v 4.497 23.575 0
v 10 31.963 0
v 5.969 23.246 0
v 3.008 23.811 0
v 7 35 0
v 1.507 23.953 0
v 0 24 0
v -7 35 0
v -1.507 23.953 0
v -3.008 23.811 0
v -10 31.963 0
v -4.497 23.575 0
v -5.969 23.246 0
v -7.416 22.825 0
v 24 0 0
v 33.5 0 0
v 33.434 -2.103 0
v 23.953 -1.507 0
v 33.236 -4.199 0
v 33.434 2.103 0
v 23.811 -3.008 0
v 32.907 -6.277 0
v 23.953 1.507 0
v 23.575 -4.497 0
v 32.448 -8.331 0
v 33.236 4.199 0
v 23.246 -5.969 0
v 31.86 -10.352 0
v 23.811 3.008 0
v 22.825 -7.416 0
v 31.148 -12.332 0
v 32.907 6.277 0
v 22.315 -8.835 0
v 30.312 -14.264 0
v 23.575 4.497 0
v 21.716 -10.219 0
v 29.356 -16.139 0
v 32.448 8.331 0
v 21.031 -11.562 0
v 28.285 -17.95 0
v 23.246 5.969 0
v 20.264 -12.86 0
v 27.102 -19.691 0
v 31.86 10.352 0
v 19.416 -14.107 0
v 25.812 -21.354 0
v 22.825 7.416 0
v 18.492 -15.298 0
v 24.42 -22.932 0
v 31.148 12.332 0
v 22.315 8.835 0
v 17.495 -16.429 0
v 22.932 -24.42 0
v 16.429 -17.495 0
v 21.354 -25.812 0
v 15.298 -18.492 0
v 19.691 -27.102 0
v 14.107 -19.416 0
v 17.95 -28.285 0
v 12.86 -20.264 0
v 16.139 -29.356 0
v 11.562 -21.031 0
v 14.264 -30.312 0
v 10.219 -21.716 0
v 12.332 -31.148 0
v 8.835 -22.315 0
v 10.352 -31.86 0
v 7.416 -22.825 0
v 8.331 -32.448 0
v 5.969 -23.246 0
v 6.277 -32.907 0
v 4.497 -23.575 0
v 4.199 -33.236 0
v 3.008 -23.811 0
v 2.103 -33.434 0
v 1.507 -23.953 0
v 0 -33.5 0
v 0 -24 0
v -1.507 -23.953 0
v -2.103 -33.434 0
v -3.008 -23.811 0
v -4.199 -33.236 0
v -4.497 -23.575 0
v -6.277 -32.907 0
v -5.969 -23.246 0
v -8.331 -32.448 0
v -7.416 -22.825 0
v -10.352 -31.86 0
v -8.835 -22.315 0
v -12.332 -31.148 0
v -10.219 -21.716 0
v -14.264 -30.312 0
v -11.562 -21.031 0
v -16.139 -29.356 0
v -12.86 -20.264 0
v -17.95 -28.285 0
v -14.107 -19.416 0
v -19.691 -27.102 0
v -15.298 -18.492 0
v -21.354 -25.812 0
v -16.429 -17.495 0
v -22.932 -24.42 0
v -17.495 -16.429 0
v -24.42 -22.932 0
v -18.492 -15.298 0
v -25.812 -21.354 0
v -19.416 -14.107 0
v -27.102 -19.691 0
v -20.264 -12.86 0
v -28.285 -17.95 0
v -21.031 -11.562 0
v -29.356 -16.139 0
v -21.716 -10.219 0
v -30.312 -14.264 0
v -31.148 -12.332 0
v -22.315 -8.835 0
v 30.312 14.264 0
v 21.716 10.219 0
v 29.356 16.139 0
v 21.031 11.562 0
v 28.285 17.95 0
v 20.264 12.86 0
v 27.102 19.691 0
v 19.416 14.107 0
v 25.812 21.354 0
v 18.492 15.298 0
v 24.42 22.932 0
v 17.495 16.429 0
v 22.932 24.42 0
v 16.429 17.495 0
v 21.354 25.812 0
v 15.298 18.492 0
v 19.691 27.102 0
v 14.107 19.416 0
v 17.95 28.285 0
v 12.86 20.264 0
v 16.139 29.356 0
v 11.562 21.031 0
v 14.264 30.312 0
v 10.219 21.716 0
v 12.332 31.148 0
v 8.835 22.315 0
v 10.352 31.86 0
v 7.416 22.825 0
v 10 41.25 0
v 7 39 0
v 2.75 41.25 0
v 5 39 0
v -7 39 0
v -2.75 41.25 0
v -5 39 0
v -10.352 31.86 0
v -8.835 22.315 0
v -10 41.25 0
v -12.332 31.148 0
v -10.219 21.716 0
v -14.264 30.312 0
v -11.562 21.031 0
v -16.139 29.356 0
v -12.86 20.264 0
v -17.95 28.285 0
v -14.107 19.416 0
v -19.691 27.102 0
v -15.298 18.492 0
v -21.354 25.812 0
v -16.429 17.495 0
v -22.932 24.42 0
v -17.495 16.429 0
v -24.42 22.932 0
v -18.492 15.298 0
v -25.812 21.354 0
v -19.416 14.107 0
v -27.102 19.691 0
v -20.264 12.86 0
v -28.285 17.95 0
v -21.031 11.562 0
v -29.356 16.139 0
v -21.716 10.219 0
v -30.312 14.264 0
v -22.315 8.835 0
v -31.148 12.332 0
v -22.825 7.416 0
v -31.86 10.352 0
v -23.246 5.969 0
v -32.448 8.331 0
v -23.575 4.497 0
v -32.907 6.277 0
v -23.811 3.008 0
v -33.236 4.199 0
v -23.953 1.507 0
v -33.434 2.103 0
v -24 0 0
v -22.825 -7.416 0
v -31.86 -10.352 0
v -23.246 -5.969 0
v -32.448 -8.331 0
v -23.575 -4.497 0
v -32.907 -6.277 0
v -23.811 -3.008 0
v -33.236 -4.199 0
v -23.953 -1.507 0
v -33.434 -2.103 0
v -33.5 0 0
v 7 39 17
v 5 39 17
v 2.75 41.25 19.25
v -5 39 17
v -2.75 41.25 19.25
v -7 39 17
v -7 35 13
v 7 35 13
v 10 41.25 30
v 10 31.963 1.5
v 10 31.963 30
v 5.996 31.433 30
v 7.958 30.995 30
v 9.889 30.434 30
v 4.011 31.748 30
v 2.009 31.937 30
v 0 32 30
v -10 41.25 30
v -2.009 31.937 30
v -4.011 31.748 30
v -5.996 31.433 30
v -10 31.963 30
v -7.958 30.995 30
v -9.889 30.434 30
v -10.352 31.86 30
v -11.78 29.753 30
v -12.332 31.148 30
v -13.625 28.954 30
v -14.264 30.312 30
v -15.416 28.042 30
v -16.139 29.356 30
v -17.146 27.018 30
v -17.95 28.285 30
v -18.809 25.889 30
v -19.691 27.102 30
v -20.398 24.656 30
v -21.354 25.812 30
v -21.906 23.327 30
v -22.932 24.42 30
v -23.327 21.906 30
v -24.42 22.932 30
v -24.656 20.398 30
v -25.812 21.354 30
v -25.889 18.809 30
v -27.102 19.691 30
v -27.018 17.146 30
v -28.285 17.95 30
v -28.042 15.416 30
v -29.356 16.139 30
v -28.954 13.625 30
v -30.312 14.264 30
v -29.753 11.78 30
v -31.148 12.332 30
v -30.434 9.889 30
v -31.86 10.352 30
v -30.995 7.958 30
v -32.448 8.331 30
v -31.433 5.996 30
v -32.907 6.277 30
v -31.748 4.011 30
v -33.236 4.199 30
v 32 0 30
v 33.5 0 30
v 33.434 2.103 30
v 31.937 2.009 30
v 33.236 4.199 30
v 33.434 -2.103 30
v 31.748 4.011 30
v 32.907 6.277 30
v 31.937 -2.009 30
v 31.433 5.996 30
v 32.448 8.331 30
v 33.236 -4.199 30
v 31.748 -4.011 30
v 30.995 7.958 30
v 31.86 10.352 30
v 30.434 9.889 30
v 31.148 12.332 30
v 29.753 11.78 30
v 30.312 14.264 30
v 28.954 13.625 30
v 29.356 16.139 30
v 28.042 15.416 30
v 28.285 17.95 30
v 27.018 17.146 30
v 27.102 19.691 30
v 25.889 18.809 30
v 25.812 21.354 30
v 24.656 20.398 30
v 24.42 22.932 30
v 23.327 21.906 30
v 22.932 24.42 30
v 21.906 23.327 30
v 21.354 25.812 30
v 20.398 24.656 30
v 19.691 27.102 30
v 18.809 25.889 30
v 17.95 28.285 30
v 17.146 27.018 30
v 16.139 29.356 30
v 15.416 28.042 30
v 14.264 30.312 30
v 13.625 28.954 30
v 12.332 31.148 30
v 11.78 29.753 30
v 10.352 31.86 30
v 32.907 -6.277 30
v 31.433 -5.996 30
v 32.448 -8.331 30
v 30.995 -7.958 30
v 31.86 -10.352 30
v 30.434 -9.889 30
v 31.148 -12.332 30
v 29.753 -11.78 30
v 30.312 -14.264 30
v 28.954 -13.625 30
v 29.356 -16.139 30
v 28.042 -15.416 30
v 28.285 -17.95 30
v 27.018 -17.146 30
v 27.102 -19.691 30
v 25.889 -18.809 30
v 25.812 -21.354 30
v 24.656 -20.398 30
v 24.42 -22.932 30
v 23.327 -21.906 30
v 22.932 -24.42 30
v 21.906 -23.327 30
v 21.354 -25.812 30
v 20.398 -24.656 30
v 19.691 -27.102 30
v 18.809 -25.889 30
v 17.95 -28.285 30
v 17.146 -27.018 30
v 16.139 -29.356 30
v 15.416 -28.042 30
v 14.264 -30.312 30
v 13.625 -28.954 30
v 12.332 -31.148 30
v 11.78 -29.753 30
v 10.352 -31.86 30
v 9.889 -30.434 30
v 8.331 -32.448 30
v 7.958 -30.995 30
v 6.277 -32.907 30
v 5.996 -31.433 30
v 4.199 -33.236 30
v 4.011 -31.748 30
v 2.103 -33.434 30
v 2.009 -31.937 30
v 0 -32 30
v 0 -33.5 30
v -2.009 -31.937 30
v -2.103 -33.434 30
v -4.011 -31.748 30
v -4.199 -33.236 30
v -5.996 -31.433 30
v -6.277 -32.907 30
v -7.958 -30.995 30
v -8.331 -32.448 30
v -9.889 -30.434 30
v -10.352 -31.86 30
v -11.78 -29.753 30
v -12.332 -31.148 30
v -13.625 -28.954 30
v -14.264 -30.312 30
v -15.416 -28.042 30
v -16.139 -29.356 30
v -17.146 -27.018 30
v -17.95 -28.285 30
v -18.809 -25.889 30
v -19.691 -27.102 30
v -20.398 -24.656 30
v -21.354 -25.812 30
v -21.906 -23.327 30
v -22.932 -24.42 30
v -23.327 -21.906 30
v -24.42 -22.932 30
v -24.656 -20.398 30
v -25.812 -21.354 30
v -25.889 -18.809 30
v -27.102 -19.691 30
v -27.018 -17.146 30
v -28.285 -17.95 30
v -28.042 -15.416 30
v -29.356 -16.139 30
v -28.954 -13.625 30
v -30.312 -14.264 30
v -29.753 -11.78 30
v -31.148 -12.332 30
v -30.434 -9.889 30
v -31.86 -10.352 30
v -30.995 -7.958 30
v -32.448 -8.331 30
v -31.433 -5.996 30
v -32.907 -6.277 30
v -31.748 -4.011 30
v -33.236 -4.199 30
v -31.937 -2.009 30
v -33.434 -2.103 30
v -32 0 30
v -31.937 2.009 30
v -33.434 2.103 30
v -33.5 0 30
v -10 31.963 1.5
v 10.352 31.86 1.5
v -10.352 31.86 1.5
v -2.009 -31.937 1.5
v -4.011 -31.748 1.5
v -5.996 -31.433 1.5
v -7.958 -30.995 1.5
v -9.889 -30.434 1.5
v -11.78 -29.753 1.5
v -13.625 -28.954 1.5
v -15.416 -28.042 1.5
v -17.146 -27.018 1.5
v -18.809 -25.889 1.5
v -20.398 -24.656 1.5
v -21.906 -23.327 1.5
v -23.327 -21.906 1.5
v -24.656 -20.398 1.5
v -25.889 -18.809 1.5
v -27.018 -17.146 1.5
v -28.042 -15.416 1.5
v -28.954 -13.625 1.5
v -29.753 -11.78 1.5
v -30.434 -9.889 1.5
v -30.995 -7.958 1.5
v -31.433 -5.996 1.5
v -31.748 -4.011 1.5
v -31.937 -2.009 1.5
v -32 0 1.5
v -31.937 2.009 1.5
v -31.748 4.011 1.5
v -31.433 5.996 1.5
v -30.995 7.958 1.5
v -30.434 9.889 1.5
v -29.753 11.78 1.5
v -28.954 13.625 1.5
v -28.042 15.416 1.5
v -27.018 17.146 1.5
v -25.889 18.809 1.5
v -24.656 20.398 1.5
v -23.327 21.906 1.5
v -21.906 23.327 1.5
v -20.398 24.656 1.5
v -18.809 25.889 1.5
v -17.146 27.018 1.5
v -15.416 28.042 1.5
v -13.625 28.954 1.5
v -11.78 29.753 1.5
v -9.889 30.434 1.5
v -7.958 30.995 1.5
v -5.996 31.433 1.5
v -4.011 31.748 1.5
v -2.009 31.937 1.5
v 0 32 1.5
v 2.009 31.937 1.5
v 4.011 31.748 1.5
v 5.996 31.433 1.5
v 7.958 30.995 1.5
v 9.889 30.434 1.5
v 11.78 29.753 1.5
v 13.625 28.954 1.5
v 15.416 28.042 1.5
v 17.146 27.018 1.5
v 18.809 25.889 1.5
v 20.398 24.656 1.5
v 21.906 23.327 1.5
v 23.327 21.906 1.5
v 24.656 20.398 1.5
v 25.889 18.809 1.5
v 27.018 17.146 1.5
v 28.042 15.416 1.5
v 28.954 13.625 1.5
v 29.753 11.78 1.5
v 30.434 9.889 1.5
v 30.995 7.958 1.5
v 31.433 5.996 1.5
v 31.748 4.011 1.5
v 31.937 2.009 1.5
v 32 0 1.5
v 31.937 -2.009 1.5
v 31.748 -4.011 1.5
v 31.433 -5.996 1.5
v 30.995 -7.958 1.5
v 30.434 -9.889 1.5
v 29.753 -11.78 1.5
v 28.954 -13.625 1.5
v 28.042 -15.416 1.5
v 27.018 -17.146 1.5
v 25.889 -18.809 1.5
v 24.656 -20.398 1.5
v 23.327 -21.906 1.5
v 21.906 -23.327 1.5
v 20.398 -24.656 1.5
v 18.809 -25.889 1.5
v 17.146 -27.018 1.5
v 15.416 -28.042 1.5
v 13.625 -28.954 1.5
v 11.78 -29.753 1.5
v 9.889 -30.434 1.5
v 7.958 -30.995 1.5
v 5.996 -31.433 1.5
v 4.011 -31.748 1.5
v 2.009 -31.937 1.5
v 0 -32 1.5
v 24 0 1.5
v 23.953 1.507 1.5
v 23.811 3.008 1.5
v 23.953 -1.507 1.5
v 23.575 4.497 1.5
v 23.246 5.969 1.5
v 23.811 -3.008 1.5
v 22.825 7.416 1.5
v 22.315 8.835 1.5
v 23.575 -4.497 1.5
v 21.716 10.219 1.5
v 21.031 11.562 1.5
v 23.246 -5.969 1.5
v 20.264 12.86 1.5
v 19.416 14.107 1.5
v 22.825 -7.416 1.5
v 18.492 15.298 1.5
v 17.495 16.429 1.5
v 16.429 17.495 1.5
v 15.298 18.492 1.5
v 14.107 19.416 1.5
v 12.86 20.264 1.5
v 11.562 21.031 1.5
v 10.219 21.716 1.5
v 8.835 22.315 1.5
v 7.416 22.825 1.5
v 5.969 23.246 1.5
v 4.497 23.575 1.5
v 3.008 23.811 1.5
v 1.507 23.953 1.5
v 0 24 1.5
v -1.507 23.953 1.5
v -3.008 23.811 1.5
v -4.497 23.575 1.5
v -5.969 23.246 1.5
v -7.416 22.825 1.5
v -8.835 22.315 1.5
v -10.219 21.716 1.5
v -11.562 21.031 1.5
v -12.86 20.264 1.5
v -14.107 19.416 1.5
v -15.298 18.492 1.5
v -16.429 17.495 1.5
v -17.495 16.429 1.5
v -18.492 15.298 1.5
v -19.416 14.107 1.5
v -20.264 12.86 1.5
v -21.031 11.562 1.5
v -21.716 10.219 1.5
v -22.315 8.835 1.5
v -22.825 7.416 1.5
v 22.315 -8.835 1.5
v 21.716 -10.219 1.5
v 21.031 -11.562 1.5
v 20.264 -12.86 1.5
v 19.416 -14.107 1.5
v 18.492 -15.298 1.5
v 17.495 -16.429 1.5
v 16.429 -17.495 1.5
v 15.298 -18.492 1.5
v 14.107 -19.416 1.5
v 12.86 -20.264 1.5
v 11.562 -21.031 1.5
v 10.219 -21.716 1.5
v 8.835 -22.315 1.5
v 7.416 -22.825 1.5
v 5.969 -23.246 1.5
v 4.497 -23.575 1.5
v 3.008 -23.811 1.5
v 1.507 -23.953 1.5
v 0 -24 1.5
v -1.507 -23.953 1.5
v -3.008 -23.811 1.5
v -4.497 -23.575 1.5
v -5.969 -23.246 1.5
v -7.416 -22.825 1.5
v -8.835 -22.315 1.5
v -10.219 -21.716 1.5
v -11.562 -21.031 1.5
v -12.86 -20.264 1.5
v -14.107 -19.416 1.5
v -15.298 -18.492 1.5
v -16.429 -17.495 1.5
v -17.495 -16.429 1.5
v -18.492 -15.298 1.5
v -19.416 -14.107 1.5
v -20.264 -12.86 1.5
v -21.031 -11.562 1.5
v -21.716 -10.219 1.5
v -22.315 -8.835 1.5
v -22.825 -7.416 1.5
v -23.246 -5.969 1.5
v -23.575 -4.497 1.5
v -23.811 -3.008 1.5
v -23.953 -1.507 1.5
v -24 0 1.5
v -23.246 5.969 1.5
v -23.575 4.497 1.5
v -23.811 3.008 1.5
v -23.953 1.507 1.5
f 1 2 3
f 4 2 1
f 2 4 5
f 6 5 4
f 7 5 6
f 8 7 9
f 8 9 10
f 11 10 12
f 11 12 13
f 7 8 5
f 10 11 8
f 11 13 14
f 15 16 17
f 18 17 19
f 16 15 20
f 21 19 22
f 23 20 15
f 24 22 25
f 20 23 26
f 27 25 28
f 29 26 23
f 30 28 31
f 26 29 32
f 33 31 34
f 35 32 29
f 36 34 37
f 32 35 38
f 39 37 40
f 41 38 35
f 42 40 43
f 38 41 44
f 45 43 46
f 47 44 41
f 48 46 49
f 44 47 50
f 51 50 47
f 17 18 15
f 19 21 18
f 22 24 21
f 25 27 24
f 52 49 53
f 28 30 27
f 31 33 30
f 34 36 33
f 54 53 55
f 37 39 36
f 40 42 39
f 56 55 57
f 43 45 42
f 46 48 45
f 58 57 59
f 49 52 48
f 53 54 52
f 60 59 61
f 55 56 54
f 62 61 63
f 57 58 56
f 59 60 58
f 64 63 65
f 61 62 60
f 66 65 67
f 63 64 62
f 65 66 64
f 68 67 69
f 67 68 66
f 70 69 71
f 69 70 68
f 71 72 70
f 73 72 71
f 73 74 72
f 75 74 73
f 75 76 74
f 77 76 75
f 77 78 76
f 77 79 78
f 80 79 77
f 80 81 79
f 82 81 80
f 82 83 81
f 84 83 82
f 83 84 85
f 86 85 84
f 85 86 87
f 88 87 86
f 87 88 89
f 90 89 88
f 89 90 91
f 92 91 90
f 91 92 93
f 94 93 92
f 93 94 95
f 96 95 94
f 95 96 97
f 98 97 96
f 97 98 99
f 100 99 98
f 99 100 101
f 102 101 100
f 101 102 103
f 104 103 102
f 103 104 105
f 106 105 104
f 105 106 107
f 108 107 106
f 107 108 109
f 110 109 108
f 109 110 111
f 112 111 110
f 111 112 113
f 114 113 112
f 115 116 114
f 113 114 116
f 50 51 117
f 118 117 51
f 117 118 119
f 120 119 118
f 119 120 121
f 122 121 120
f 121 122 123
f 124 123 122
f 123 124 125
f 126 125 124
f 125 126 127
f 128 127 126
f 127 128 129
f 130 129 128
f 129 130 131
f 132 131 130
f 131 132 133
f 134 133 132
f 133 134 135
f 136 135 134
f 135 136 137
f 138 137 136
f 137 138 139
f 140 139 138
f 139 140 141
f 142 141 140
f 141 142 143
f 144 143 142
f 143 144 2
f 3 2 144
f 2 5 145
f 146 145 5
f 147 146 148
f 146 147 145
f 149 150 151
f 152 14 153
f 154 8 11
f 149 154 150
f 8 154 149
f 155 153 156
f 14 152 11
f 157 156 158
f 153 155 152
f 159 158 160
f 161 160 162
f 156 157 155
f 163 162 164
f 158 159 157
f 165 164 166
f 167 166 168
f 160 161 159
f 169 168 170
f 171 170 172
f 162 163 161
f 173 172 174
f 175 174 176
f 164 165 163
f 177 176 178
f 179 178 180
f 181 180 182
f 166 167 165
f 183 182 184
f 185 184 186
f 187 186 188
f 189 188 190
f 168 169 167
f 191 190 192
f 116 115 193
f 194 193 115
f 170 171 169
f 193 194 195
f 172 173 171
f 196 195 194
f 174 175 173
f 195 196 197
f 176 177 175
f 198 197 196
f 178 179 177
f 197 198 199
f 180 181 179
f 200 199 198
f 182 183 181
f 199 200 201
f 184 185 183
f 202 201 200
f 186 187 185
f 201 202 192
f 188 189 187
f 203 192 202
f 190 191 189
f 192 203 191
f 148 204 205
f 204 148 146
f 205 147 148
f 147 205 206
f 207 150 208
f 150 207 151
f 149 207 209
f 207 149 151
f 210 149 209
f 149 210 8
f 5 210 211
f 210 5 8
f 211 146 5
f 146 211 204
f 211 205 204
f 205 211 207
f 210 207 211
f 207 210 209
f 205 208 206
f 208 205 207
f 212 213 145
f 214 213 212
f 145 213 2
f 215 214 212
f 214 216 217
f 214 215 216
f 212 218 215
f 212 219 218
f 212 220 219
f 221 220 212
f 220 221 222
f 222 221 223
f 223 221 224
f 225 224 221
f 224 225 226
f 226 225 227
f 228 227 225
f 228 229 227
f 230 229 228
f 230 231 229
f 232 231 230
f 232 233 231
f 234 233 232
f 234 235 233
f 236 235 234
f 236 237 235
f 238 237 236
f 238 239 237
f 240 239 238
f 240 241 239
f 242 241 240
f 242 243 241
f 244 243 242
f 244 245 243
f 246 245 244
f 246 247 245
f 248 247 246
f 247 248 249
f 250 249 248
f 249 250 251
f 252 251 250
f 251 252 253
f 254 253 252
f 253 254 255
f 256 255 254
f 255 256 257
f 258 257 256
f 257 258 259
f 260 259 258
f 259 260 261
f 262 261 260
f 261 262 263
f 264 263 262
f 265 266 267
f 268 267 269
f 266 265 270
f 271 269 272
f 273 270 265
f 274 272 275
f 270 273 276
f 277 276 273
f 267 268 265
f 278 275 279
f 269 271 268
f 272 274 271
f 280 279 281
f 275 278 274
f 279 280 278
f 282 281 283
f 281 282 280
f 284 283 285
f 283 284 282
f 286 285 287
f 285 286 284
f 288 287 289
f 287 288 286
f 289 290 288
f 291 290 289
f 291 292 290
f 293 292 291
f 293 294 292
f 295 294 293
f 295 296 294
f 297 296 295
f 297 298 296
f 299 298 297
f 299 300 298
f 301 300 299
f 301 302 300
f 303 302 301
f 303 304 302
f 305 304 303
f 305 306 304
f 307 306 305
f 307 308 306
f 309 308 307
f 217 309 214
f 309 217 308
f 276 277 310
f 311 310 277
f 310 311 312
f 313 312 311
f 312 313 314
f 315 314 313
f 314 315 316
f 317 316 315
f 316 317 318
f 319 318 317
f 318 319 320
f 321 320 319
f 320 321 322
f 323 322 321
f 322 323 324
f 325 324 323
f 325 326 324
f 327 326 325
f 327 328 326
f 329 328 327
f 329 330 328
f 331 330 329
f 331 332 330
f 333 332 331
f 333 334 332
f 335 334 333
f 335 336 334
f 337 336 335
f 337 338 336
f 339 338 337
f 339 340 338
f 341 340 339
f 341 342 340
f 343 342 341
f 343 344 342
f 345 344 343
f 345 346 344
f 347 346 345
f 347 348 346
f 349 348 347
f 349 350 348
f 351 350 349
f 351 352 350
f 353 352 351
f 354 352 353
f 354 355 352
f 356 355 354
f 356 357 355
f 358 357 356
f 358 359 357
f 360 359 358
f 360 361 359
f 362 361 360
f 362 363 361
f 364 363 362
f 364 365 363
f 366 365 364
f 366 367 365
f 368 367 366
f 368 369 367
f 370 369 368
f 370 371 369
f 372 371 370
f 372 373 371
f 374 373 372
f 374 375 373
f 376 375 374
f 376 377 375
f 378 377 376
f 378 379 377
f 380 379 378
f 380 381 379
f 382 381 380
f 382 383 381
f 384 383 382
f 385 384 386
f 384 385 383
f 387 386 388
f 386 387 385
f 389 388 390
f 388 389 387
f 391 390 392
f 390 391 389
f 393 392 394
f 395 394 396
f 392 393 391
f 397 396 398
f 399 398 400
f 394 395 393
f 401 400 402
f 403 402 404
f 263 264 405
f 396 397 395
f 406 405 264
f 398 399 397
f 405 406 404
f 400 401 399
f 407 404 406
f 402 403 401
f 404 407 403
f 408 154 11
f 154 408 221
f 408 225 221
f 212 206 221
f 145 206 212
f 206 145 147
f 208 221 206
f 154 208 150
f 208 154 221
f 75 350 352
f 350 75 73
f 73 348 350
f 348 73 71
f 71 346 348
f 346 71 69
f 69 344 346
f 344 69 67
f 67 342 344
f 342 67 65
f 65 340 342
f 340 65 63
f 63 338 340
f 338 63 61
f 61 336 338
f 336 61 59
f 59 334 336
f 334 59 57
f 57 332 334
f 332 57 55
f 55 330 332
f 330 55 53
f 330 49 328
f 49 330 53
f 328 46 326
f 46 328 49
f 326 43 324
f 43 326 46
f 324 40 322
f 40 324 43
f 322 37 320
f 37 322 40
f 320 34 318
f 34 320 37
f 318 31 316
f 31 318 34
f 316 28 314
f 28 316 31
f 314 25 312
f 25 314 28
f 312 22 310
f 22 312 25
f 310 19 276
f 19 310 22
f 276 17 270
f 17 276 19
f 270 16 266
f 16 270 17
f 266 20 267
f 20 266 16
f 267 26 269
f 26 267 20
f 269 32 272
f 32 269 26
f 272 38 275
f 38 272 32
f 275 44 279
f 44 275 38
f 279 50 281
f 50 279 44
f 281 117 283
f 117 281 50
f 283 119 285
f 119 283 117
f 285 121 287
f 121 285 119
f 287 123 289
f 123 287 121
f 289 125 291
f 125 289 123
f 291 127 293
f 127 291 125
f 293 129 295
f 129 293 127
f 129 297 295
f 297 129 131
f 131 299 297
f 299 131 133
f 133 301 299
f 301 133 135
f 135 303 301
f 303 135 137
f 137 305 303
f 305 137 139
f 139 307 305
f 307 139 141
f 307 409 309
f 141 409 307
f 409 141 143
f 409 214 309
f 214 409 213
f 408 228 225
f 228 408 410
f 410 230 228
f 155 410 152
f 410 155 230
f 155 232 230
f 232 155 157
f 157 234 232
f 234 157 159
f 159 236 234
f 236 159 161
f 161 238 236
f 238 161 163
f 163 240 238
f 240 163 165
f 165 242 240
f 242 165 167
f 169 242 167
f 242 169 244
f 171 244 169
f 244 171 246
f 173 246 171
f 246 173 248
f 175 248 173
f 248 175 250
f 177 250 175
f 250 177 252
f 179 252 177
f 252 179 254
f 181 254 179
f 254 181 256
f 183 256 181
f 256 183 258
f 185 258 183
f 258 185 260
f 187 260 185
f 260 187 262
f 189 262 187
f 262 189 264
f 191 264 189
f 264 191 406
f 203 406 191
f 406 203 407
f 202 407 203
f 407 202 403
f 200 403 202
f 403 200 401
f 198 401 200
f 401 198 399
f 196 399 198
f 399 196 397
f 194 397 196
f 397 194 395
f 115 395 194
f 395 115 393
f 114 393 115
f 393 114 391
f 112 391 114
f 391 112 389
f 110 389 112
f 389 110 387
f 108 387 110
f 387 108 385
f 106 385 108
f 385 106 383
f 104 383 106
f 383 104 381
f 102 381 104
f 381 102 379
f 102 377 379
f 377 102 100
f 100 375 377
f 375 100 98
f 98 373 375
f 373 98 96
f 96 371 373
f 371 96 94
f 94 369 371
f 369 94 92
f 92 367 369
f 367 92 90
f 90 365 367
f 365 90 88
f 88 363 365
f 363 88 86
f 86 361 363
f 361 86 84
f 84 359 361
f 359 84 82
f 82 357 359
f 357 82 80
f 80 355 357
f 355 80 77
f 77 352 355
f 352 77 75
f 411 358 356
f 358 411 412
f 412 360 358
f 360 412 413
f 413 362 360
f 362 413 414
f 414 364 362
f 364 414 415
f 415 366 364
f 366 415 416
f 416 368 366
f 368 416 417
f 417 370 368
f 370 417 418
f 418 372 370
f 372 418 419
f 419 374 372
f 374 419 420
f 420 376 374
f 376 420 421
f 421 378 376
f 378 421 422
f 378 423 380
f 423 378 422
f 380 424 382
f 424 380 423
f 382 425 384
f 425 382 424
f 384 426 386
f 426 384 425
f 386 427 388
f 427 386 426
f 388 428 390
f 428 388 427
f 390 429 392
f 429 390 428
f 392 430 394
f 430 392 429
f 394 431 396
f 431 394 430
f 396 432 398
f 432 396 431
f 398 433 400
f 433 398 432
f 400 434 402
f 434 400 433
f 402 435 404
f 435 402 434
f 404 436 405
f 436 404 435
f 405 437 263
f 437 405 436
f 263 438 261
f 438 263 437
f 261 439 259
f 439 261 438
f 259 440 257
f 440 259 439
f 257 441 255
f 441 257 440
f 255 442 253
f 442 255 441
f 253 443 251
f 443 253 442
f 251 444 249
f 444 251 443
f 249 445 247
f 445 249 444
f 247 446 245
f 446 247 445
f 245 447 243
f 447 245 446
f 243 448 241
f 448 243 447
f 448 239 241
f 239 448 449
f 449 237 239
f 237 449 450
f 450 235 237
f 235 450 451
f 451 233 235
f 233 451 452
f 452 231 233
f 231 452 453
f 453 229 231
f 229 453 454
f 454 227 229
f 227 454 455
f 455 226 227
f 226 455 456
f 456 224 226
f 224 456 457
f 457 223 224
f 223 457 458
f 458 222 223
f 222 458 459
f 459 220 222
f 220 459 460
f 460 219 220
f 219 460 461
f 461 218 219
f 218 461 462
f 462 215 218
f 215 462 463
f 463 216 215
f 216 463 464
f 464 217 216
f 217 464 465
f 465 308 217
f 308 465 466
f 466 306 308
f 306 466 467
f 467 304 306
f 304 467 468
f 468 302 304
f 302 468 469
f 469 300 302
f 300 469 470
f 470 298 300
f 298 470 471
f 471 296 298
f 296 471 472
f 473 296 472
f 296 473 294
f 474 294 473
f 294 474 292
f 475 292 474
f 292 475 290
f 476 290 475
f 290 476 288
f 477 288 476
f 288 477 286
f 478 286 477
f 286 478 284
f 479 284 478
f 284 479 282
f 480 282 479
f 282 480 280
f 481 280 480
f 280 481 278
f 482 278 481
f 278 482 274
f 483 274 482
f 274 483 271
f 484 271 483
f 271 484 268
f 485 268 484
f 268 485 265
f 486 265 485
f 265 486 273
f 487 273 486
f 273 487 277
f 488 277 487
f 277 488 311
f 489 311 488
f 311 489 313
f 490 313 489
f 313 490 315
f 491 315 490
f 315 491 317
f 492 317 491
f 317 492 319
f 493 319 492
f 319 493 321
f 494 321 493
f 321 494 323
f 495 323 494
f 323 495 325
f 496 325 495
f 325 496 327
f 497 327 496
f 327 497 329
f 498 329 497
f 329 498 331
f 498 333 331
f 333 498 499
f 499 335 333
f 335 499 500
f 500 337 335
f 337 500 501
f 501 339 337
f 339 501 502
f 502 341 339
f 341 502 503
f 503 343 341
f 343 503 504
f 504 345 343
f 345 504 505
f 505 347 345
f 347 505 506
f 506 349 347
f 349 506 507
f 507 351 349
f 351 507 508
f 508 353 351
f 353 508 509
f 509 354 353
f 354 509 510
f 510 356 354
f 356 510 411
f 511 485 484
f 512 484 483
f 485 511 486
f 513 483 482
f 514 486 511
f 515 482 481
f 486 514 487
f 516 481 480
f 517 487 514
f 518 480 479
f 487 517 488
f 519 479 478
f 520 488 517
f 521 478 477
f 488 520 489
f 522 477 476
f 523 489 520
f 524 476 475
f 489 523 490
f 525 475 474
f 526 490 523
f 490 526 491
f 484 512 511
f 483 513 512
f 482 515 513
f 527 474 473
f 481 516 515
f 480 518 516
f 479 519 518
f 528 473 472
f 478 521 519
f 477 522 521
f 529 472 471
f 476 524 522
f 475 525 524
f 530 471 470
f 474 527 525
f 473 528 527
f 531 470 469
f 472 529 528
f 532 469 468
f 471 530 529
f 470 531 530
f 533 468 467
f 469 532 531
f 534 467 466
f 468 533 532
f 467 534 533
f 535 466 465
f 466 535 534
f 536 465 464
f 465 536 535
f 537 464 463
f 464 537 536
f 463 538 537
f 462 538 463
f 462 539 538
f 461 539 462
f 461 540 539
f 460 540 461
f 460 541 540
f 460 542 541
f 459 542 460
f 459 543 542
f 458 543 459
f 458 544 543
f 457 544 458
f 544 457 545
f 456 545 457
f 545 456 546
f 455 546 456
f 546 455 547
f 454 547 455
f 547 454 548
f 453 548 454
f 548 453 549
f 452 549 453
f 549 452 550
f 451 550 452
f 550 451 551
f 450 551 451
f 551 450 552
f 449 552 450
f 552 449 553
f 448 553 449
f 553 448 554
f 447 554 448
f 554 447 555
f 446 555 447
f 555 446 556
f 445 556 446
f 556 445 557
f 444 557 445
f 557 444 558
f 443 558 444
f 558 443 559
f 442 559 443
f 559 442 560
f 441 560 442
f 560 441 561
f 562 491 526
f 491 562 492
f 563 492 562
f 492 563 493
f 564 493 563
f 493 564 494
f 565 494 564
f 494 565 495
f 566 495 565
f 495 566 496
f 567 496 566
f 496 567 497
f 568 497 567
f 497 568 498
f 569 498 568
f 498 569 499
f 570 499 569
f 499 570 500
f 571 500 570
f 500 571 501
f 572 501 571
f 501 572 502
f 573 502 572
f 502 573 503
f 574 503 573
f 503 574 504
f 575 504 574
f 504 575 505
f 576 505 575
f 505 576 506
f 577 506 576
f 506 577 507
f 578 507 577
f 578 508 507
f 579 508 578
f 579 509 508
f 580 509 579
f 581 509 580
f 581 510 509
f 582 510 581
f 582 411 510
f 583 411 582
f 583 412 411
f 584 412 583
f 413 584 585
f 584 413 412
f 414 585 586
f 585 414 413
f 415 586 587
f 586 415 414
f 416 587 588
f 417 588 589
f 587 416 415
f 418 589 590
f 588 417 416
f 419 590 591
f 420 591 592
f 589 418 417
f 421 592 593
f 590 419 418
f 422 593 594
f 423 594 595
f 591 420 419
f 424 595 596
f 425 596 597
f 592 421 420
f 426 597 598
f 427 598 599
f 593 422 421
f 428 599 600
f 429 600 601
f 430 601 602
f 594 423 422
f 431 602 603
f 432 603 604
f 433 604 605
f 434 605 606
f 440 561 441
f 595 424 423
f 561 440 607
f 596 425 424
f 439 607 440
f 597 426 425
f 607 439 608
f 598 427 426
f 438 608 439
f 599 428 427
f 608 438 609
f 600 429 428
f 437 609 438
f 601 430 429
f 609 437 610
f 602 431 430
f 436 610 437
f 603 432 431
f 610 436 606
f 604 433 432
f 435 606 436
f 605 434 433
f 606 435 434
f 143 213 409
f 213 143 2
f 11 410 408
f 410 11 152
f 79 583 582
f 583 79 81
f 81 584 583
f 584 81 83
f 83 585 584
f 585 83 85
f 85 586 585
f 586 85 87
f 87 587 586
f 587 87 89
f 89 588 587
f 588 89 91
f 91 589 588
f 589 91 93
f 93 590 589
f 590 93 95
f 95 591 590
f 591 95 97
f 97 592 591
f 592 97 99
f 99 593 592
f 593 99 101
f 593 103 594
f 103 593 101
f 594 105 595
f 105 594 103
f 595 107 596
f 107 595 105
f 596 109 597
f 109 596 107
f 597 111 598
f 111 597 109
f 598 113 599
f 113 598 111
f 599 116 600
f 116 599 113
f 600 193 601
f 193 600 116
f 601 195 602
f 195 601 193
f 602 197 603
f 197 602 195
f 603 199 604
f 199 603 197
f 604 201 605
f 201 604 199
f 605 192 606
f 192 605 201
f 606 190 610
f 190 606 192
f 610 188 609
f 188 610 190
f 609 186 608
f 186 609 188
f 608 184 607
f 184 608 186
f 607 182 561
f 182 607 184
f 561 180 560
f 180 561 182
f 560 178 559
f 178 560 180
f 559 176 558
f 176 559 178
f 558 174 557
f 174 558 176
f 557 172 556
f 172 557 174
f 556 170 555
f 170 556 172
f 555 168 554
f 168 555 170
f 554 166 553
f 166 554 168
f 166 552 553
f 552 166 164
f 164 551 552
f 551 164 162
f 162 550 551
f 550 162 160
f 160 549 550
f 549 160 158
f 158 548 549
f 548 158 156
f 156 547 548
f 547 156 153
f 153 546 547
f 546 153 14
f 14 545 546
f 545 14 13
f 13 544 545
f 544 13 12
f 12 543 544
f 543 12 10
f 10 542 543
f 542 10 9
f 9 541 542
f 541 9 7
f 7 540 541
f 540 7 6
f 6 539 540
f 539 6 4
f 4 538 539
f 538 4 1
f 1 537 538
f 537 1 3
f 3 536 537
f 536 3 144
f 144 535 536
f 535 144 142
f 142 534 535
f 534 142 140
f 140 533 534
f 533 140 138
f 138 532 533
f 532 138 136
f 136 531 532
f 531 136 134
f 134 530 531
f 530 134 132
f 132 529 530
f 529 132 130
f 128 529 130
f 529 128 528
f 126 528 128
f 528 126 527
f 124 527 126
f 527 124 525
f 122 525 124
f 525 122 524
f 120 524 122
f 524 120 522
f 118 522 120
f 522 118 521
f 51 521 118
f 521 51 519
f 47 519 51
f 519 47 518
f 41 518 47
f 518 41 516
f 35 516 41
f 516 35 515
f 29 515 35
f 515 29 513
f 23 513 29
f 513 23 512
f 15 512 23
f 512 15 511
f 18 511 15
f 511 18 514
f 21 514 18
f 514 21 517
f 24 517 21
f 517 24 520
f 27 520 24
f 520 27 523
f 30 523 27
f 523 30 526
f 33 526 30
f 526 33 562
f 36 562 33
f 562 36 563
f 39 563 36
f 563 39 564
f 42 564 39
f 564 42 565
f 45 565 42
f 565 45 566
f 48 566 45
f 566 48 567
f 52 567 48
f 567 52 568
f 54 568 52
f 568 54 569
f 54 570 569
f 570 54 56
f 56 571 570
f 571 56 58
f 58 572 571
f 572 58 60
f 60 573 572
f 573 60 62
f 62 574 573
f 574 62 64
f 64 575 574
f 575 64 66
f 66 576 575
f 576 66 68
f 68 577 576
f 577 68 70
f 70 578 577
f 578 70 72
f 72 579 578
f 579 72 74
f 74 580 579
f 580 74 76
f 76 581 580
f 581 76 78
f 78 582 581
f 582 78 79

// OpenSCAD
// file: defs.scad
width = 10;
height = 80;
angle = atan (width / height);
diag = height / cos(angle) + width * tan(angle);
slack = 0.75;

up_down_trim = width*sin(angle);

module slot_poly (slot_slack) {
    polygon ([
        [7-slot_slack, -7+slot_slack],
        [-7+slot_slack, -7+slot_slack],
        [-7+slot_slack, -3-slot_slack],
        [-5, -3-slot_slack],
        [-2+slot_slack, 0],
        [2-slot_slack, 0],
        [5, -3-slot_slack],
        [7-slot_slack, -3-slot_slack]
    ]);
}
// main file
include <defs.scad>

$fn=100;

h = 30;

difference () {
    translate ([0, 32, 0])
    difference () {
        linear_extrude (h) {
            polygon ([
                [10, width-slack],
                [-10, width-slack],
                [-10, 0],
                [10, 0]
            ]);
        }
        difference () {
            linear_extrude (h-3)
            translate ([0, width, 0])
                    slot_poly (0);
            translate ([-15, 0, h-20])
            rotate ([45, 0, 0]) cube (30);
        }
    }
}

linear_extrude (h) {
    difference () {
        union () {
            circle (33.5);
            polygon ([
                [10, 32],
                [-10, 32],
                [-10, 15],
                [10, 15]
            ]);
        }
        circle (32);
    }
}
linear_extrude (1.5)
    difference () {
        circle (33.5);
        circle (24);
    }
